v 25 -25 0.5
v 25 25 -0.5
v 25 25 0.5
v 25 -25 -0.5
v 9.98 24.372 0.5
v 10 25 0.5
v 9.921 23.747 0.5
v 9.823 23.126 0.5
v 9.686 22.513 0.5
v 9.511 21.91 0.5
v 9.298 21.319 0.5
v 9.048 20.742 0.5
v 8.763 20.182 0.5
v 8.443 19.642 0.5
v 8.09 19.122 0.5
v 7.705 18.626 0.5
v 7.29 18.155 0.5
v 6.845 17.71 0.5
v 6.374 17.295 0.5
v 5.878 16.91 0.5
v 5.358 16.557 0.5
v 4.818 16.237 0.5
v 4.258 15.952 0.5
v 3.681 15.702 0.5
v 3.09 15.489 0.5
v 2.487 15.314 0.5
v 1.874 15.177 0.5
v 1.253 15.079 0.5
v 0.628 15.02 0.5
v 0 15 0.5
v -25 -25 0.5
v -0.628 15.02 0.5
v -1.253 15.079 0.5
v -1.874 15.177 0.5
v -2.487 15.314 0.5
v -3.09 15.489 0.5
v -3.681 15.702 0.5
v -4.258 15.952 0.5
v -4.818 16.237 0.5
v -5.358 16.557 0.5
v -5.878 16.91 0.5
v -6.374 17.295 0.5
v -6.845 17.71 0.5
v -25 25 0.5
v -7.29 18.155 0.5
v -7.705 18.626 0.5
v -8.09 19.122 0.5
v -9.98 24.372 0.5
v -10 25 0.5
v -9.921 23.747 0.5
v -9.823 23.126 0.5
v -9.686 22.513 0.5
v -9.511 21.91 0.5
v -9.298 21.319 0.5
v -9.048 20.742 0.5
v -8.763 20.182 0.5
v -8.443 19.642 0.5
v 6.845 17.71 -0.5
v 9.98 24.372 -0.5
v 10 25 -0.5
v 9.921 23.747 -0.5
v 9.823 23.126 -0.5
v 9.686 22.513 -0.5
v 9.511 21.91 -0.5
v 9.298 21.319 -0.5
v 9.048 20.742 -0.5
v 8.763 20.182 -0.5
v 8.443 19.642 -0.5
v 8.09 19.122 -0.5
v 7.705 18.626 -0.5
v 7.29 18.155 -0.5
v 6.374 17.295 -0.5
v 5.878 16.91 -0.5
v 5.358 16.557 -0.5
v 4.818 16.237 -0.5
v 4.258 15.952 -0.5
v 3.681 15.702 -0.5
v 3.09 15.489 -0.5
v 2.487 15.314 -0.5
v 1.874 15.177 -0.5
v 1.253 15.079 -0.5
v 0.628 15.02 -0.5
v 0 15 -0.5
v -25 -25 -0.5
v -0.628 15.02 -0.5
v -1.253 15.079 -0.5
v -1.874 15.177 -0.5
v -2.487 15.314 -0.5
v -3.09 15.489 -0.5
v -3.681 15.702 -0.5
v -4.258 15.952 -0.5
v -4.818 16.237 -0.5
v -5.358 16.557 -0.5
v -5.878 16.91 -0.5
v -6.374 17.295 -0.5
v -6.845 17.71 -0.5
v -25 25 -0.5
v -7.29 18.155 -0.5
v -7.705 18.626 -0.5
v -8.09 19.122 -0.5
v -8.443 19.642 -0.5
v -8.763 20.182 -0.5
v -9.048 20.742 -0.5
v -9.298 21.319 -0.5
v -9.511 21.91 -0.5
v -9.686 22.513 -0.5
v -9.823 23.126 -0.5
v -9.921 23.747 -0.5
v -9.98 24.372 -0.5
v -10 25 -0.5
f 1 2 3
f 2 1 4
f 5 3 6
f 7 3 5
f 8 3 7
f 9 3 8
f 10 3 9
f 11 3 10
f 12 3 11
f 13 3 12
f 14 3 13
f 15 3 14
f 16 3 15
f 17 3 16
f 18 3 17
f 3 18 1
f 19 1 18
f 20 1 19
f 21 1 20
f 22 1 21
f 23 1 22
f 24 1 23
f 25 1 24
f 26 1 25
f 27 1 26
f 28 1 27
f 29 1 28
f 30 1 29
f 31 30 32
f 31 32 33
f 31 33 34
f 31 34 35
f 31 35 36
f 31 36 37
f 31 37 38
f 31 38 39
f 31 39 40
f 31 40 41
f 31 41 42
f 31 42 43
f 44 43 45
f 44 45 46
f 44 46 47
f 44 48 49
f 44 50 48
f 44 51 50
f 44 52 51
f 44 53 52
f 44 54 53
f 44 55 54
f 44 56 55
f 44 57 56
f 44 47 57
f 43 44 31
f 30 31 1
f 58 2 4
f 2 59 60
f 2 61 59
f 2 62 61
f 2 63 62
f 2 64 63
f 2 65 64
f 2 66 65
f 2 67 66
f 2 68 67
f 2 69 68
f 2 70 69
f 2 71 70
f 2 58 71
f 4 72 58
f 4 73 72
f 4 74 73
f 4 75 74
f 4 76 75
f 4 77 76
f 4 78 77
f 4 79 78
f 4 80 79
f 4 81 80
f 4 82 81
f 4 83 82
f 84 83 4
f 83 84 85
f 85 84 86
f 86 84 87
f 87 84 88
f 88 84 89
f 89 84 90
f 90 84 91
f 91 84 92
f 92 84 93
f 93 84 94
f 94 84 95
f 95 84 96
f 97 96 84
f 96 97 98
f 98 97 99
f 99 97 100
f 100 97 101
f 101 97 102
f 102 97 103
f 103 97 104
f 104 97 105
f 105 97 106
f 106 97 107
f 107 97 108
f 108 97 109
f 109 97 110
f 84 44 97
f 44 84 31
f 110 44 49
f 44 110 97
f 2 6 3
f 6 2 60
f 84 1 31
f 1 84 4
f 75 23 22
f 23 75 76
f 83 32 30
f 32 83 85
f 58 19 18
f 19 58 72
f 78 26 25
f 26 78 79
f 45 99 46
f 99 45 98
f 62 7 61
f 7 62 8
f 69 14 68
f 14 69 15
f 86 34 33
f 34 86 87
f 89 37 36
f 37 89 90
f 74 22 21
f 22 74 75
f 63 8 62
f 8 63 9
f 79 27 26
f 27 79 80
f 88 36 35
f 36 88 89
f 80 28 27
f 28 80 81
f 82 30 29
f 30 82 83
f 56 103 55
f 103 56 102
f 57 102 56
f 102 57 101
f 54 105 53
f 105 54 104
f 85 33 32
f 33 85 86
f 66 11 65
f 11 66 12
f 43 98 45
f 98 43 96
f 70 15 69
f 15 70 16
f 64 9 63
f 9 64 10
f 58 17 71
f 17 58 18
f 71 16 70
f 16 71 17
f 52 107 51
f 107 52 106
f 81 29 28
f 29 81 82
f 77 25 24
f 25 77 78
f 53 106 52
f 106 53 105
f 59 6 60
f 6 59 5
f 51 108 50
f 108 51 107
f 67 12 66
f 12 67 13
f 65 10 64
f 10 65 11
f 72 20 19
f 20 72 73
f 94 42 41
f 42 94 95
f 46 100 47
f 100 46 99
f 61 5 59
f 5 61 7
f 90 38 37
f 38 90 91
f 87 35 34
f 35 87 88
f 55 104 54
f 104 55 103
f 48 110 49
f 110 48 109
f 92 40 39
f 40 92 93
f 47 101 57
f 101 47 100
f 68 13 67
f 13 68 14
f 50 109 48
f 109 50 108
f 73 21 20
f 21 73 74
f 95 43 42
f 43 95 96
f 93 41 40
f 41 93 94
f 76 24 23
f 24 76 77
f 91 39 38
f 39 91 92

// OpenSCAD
$fn = 100;

module shelf(length, width, thickness, fingerSlotSize){
  difference(){
    cube([length, width, thickness], true);
    translate([0,width/2,-thickness]) cylinder(r=fingerSlotSize, h=thickness*2);
  } 
}

shelf(50, 50, 1, 10);
